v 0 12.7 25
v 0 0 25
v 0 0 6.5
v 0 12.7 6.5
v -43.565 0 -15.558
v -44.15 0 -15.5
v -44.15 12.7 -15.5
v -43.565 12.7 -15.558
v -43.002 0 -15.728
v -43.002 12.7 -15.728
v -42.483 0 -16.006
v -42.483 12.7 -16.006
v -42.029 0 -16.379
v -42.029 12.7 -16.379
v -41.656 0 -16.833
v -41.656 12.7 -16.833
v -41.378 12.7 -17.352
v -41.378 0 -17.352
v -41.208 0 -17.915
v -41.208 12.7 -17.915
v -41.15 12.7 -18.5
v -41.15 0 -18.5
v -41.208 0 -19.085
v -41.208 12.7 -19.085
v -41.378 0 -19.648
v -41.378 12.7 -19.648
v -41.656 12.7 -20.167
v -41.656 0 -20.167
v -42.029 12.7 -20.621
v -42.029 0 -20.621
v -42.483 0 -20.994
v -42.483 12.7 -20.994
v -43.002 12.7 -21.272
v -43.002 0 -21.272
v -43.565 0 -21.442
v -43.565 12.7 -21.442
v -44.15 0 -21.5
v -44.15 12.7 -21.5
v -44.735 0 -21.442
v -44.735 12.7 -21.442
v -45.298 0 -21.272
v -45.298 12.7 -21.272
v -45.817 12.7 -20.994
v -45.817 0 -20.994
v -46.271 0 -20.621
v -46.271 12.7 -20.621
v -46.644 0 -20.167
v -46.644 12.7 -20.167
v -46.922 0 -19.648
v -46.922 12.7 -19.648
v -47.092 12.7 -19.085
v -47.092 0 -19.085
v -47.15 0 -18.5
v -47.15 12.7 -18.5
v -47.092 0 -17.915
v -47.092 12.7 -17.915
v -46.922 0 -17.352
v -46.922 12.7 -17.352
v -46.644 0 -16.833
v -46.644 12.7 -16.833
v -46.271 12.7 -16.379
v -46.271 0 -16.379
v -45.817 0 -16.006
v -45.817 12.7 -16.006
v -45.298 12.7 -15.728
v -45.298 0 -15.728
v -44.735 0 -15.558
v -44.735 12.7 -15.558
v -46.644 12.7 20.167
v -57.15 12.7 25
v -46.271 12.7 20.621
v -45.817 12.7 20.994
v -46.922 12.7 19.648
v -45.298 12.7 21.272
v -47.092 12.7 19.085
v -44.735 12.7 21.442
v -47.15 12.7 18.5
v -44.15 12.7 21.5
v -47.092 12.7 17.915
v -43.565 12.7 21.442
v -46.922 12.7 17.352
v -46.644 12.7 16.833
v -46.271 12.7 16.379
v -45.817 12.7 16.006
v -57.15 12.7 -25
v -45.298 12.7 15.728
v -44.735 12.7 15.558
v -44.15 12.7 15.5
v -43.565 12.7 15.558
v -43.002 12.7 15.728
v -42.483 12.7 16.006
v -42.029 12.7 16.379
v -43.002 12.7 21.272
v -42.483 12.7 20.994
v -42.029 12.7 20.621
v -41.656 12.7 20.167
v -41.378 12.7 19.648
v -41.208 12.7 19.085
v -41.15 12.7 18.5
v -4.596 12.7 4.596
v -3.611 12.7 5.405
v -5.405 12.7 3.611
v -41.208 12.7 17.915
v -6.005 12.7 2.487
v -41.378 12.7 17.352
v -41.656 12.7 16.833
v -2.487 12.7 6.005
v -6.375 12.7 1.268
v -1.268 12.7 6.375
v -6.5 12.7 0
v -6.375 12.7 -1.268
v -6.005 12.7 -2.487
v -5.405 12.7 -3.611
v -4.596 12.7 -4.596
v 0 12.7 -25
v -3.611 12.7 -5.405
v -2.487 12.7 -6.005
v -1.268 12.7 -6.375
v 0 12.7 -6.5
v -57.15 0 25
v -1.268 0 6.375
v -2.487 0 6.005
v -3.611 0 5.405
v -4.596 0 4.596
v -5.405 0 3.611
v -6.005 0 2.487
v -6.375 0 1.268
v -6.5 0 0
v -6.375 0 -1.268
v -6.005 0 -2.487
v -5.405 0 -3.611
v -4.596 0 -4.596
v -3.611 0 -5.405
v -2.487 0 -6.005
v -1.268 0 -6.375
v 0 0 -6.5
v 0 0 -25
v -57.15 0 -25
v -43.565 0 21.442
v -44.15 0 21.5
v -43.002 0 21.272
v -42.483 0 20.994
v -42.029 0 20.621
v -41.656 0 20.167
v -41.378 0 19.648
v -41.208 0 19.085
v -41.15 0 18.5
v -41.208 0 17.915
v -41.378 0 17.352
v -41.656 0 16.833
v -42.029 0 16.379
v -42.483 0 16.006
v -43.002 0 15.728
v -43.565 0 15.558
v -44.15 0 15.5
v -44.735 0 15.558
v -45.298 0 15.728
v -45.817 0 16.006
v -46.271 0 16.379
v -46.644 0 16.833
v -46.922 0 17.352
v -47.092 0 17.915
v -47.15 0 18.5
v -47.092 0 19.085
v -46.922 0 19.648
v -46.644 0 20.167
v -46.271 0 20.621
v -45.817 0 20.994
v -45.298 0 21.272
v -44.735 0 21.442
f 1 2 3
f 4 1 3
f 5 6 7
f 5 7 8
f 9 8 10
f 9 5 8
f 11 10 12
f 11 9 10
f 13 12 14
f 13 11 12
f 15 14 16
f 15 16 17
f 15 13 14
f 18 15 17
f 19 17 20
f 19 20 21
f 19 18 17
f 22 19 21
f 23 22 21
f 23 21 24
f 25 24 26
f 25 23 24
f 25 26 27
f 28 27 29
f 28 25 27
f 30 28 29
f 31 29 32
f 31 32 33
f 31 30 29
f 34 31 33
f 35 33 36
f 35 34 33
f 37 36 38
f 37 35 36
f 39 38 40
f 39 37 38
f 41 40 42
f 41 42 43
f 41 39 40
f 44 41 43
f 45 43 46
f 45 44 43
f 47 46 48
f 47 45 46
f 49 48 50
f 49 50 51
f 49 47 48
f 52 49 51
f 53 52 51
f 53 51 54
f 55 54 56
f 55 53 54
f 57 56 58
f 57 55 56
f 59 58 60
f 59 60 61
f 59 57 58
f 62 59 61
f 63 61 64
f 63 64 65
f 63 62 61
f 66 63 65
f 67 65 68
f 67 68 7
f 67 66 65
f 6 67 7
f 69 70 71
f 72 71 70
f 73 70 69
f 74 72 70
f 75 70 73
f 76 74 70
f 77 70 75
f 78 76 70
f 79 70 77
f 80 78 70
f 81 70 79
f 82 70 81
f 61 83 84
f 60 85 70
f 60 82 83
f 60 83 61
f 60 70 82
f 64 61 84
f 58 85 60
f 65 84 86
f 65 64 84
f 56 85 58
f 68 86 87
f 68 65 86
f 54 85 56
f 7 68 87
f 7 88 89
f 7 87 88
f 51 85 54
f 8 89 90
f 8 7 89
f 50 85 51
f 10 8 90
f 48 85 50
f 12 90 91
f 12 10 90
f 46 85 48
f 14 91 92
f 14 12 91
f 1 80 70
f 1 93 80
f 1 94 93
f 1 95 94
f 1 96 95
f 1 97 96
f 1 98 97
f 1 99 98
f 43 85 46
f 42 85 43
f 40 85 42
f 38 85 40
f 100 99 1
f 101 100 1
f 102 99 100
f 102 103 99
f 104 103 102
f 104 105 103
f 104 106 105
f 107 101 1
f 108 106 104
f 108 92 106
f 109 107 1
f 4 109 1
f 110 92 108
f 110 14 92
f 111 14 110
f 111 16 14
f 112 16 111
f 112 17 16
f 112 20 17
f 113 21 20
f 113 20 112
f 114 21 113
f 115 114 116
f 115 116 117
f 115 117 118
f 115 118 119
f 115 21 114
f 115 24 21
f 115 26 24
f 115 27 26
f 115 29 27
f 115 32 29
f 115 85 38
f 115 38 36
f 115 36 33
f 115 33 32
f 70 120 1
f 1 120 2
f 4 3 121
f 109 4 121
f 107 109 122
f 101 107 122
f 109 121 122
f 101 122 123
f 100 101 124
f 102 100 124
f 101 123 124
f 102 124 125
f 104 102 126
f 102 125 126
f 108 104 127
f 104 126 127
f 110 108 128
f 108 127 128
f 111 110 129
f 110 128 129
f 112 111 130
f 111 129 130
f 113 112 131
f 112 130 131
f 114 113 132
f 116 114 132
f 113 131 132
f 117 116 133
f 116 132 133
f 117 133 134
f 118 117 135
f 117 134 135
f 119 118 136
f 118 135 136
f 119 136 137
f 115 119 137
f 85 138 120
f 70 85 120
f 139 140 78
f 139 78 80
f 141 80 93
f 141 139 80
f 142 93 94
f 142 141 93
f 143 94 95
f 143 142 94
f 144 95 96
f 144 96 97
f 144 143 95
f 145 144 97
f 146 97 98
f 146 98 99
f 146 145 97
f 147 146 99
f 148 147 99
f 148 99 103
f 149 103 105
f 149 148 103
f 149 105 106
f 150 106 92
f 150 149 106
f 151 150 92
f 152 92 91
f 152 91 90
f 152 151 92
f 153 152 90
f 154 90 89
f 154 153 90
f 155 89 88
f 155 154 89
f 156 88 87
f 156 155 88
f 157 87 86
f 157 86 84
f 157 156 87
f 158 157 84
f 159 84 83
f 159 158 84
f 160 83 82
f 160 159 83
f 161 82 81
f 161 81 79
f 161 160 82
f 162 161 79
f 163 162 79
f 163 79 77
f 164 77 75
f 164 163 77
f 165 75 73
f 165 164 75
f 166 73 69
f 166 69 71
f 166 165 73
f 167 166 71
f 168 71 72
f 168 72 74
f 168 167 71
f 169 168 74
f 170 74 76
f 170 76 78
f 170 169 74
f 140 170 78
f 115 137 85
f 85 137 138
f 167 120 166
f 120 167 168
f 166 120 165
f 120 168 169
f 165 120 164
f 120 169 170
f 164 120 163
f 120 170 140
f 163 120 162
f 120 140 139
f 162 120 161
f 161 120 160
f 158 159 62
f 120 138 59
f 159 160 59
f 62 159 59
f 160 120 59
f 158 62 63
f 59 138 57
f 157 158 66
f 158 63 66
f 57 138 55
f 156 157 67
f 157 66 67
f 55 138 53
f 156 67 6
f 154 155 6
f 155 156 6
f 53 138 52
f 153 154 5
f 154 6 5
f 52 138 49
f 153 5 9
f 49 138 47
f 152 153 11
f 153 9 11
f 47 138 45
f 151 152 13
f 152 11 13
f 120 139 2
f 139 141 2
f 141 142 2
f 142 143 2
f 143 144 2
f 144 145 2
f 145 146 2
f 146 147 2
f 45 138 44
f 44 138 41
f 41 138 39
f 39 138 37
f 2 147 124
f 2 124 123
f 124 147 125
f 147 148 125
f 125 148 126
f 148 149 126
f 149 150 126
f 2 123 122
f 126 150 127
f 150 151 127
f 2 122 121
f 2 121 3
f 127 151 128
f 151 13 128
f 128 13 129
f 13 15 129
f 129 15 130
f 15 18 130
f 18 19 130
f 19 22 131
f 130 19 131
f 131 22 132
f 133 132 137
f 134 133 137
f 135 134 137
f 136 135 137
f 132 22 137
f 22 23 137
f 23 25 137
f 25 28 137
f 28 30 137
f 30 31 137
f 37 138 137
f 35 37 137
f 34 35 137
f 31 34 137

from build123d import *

# Parameters (mm, degrees)
CROQUIS2_R              = 3
SALIENTE_EXTRUIR1_DEPTH = 12.7


with BuildPart() as part:
    # Croquis2 → Saliente-Extruir1 (new body)
    with BuildSketch(Plane(origin=(0, 0, 0), x_dir=(1, 0, 0), z_dir=(0, 1, 0))):
        with BuildLine():
            Line((0, 25), (-57.15, 25))
            Line((-57.15, 25), (-57.15, -25))
            Line((-57.15, -25), (0, -25))
            Line((0, -25), (0, -6.5))
            ThreePointArc((0, -6.5), (-6.5, 0), (0, 6.5))
            Line((0, 6.5), (0, 25))
        make_face()
        with Locations(Location((-44.15, -18.5, 0), (0, 0, 270))):
            Circle(CROQUIS2_R, mode=Mode.SUBTRACT)
        with Locations(Location((-44.15, 18.5, 0), (0, 0, 270))):
            Circle(CROQUIS2_R, mode=Mode.SUBTRACT)
    extrude(amount=SALIENTE_EXTRUIR1_DEPTH)


solid = part.part
